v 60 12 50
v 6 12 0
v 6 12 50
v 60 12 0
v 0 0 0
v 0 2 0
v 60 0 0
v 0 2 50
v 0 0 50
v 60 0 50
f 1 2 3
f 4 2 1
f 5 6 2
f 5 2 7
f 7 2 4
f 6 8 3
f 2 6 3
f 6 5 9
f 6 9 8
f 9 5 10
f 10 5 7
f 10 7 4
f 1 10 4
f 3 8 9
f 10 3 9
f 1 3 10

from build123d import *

# Parameters (mm, degrees)
SKETCH1_W           = 60
SKETCH1_H           = 12
BOSS_EXTRUDE1_DEPTH = 50
CUT_EXTRUDE1_DEPTH  = 80.018985061


with BuildPart() as part:
    # Sketch1 → Boss-Extrude1 (new body)
    with BuildSketch(Plane.XY):
        with Locations((30, 6)):
            Rectangle(SKETCH1_W, SKETCH1_H)
    extrude(amount=BOSS_EXTRUDE1_DEPTH)

    # Sketch2 → Cut-Extrude1 (cut, through all)
    with BuildSketch(Plane.XY.offset(50)):
        Polygon((0, 2), (6, 12), (0, 12), align=None)
    extrude(amount=-CUT_EXTRUDE1_DEPTH, mode=Mode.SUBTRACT)


solid = part.part
